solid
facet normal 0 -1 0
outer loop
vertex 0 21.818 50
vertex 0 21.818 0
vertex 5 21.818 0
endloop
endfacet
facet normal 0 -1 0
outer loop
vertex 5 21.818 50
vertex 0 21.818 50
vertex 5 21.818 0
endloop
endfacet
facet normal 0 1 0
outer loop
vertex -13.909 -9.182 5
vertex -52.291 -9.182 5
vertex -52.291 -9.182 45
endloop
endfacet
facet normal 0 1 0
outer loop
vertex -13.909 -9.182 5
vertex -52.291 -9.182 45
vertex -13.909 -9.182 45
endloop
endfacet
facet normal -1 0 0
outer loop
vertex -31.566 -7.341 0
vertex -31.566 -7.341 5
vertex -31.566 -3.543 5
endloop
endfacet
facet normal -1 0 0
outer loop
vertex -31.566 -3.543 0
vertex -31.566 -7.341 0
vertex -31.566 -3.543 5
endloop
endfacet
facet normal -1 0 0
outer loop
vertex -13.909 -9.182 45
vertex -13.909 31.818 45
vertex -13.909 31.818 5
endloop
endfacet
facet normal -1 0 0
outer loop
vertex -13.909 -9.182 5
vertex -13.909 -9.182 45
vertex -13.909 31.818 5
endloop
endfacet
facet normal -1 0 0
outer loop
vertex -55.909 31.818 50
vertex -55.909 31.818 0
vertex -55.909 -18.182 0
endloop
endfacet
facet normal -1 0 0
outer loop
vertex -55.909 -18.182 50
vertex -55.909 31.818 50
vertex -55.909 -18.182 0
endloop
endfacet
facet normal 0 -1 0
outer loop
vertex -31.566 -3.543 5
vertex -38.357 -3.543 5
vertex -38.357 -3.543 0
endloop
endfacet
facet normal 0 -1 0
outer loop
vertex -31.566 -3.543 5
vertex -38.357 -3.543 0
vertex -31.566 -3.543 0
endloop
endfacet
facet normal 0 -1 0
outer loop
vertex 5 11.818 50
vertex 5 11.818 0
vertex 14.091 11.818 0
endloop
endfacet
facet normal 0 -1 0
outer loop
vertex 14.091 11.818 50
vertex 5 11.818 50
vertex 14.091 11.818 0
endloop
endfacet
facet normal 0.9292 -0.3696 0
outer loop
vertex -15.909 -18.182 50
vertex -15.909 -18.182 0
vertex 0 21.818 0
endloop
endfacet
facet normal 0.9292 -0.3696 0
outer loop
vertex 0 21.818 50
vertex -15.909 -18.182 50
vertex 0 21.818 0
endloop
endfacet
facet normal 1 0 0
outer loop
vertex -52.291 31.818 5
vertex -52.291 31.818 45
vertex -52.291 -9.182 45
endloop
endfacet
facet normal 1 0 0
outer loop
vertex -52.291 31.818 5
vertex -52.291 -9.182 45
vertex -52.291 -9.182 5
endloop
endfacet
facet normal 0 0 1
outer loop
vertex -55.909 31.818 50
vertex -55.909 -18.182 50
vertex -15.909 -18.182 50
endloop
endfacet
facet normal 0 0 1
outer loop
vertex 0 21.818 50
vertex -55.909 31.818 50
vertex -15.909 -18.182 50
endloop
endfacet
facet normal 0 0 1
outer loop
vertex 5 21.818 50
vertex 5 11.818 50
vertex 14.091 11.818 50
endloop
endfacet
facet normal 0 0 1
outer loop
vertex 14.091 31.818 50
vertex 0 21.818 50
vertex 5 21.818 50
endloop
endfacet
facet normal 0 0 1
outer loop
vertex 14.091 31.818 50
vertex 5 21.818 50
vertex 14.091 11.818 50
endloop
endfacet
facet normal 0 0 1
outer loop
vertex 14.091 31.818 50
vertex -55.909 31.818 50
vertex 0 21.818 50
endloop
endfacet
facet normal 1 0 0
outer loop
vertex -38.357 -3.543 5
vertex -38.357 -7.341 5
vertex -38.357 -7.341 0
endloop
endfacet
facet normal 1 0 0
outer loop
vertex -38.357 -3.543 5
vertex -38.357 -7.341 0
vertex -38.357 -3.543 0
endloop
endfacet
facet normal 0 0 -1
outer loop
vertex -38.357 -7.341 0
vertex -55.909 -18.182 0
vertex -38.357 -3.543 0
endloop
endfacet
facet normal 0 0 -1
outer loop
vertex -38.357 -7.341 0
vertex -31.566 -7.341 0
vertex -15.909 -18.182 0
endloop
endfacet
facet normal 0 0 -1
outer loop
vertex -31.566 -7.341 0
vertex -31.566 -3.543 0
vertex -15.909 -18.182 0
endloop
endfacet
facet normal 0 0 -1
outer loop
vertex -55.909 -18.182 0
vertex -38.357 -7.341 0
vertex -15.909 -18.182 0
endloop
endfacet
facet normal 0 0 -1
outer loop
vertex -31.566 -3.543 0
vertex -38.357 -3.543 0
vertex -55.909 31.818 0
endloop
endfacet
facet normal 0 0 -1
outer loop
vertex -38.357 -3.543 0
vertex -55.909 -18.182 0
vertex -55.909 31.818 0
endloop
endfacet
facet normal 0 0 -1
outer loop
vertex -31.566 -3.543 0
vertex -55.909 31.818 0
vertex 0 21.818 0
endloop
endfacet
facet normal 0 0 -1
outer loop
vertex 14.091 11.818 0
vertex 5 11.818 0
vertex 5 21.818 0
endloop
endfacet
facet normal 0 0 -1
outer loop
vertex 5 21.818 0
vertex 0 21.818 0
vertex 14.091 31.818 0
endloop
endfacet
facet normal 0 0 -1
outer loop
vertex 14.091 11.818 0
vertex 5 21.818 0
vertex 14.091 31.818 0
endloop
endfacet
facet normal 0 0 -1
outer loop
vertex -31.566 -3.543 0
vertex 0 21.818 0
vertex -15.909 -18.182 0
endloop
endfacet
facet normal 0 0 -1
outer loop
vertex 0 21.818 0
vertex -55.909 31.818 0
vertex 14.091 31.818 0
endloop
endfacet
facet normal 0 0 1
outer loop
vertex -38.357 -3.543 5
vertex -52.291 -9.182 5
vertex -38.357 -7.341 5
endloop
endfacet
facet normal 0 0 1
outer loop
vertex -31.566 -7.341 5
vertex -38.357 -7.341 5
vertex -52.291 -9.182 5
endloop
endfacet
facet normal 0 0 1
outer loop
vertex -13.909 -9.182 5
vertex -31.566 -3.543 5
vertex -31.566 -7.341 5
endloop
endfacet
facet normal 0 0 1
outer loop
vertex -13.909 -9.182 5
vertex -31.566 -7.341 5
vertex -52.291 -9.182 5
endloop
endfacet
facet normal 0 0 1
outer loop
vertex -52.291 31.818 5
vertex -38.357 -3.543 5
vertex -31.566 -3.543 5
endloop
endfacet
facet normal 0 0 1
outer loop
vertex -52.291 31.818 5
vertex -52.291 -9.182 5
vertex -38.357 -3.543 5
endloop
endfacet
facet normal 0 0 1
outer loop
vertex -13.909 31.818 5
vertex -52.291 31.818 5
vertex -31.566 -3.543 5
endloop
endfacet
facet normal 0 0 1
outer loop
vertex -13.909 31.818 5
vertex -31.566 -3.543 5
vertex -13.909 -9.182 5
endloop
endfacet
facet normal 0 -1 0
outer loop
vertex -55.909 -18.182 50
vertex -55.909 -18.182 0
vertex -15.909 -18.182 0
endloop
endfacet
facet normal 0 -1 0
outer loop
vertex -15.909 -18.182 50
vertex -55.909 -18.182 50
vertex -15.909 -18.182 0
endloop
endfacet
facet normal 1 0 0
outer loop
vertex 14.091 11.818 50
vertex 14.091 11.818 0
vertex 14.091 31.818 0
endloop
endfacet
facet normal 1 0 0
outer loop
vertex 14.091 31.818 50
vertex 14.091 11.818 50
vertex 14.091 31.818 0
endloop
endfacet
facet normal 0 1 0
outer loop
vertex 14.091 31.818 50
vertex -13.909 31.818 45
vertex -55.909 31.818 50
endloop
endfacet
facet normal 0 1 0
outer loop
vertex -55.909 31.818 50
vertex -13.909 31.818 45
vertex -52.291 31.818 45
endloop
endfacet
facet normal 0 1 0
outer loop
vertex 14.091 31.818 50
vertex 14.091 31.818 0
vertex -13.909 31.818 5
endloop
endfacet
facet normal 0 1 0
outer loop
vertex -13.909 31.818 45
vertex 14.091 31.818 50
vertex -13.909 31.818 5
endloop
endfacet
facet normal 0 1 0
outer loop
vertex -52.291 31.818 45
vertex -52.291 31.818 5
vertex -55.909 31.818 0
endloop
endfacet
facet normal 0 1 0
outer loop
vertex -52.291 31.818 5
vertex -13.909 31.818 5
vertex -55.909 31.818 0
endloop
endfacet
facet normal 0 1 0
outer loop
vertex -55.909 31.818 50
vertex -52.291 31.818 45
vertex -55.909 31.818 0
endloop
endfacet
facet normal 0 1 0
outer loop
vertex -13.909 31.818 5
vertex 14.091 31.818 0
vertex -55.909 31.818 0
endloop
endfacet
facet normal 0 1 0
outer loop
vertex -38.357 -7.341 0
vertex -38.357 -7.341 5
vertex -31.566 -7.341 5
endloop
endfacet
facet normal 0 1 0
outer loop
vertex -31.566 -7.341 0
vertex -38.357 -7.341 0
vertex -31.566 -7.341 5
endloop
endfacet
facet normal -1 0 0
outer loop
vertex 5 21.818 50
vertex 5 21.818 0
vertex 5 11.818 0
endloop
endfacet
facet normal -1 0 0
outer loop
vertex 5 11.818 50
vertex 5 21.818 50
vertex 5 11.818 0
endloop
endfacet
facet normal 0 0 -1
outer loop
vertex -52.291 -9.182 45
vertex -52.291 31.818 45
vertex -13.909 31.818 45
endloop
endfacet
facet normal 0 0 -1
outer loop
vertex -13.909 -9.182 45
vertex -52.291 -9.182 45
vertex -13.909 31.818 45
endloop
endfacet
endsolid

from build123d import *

# Parameters (mm, degrees)
BOSS_EXTRUDE1_DEPTH = 50
SKETCH2_W           = 38.381895626
SKETCH2_H           = 40
CUT_EXTRUDE2_DEPTH  = 41
SKETCH4_W           = 6.790896345
SKETCH4_H           = 3.798015254
CUT_EXTRUDE3_DEPTH  = 5


with BuildPart() as part:
    # Sketch1 → Boss-Extrude1 (new body)
    with BuildSketch(Plane.XY):
        Polygon((-55.909090909, 31.818181818), (-55.909090909, -18.181818182), (-15.909090909, -18.181818182), (0, 21.818181818), (5, 21.818181818), (5, 11.818181818), (14.090909091, 11.818181818), (14.090909091, 31.818181818), align=None)
    extrude(amount=BOSS_EXTRUDE1_DEPTH)

    # Sketch2 → Cut-Extrude2 (cut)
    with BuildSketch(Plane(origin=(0, 31.818181818, 0), x_dir=(1, 0, 0), z_dir=(0, 1, 0))):
        with Locations((-33.100038722, -25)):
            Rectangle(SKETCH2_W, SKETCH2_H)
    extrude(amount=-CUT_EXTRUDE2_DEPTH, mode=Mode.SUBTRACT)

    # Sketch4 → Cut-Extrude3 (cut)
    with BuildSketch(Plane.XY.offset(5)):
        with Locations((-34.961451434, -5.442472673)):
            Rectangle(SKETCH4_W, SKETCH4_H)
    extrude(amount=-CUT_EXTRUDE3_DEPTH, mode=Mode.SUBTRACT)


solid = part.part
